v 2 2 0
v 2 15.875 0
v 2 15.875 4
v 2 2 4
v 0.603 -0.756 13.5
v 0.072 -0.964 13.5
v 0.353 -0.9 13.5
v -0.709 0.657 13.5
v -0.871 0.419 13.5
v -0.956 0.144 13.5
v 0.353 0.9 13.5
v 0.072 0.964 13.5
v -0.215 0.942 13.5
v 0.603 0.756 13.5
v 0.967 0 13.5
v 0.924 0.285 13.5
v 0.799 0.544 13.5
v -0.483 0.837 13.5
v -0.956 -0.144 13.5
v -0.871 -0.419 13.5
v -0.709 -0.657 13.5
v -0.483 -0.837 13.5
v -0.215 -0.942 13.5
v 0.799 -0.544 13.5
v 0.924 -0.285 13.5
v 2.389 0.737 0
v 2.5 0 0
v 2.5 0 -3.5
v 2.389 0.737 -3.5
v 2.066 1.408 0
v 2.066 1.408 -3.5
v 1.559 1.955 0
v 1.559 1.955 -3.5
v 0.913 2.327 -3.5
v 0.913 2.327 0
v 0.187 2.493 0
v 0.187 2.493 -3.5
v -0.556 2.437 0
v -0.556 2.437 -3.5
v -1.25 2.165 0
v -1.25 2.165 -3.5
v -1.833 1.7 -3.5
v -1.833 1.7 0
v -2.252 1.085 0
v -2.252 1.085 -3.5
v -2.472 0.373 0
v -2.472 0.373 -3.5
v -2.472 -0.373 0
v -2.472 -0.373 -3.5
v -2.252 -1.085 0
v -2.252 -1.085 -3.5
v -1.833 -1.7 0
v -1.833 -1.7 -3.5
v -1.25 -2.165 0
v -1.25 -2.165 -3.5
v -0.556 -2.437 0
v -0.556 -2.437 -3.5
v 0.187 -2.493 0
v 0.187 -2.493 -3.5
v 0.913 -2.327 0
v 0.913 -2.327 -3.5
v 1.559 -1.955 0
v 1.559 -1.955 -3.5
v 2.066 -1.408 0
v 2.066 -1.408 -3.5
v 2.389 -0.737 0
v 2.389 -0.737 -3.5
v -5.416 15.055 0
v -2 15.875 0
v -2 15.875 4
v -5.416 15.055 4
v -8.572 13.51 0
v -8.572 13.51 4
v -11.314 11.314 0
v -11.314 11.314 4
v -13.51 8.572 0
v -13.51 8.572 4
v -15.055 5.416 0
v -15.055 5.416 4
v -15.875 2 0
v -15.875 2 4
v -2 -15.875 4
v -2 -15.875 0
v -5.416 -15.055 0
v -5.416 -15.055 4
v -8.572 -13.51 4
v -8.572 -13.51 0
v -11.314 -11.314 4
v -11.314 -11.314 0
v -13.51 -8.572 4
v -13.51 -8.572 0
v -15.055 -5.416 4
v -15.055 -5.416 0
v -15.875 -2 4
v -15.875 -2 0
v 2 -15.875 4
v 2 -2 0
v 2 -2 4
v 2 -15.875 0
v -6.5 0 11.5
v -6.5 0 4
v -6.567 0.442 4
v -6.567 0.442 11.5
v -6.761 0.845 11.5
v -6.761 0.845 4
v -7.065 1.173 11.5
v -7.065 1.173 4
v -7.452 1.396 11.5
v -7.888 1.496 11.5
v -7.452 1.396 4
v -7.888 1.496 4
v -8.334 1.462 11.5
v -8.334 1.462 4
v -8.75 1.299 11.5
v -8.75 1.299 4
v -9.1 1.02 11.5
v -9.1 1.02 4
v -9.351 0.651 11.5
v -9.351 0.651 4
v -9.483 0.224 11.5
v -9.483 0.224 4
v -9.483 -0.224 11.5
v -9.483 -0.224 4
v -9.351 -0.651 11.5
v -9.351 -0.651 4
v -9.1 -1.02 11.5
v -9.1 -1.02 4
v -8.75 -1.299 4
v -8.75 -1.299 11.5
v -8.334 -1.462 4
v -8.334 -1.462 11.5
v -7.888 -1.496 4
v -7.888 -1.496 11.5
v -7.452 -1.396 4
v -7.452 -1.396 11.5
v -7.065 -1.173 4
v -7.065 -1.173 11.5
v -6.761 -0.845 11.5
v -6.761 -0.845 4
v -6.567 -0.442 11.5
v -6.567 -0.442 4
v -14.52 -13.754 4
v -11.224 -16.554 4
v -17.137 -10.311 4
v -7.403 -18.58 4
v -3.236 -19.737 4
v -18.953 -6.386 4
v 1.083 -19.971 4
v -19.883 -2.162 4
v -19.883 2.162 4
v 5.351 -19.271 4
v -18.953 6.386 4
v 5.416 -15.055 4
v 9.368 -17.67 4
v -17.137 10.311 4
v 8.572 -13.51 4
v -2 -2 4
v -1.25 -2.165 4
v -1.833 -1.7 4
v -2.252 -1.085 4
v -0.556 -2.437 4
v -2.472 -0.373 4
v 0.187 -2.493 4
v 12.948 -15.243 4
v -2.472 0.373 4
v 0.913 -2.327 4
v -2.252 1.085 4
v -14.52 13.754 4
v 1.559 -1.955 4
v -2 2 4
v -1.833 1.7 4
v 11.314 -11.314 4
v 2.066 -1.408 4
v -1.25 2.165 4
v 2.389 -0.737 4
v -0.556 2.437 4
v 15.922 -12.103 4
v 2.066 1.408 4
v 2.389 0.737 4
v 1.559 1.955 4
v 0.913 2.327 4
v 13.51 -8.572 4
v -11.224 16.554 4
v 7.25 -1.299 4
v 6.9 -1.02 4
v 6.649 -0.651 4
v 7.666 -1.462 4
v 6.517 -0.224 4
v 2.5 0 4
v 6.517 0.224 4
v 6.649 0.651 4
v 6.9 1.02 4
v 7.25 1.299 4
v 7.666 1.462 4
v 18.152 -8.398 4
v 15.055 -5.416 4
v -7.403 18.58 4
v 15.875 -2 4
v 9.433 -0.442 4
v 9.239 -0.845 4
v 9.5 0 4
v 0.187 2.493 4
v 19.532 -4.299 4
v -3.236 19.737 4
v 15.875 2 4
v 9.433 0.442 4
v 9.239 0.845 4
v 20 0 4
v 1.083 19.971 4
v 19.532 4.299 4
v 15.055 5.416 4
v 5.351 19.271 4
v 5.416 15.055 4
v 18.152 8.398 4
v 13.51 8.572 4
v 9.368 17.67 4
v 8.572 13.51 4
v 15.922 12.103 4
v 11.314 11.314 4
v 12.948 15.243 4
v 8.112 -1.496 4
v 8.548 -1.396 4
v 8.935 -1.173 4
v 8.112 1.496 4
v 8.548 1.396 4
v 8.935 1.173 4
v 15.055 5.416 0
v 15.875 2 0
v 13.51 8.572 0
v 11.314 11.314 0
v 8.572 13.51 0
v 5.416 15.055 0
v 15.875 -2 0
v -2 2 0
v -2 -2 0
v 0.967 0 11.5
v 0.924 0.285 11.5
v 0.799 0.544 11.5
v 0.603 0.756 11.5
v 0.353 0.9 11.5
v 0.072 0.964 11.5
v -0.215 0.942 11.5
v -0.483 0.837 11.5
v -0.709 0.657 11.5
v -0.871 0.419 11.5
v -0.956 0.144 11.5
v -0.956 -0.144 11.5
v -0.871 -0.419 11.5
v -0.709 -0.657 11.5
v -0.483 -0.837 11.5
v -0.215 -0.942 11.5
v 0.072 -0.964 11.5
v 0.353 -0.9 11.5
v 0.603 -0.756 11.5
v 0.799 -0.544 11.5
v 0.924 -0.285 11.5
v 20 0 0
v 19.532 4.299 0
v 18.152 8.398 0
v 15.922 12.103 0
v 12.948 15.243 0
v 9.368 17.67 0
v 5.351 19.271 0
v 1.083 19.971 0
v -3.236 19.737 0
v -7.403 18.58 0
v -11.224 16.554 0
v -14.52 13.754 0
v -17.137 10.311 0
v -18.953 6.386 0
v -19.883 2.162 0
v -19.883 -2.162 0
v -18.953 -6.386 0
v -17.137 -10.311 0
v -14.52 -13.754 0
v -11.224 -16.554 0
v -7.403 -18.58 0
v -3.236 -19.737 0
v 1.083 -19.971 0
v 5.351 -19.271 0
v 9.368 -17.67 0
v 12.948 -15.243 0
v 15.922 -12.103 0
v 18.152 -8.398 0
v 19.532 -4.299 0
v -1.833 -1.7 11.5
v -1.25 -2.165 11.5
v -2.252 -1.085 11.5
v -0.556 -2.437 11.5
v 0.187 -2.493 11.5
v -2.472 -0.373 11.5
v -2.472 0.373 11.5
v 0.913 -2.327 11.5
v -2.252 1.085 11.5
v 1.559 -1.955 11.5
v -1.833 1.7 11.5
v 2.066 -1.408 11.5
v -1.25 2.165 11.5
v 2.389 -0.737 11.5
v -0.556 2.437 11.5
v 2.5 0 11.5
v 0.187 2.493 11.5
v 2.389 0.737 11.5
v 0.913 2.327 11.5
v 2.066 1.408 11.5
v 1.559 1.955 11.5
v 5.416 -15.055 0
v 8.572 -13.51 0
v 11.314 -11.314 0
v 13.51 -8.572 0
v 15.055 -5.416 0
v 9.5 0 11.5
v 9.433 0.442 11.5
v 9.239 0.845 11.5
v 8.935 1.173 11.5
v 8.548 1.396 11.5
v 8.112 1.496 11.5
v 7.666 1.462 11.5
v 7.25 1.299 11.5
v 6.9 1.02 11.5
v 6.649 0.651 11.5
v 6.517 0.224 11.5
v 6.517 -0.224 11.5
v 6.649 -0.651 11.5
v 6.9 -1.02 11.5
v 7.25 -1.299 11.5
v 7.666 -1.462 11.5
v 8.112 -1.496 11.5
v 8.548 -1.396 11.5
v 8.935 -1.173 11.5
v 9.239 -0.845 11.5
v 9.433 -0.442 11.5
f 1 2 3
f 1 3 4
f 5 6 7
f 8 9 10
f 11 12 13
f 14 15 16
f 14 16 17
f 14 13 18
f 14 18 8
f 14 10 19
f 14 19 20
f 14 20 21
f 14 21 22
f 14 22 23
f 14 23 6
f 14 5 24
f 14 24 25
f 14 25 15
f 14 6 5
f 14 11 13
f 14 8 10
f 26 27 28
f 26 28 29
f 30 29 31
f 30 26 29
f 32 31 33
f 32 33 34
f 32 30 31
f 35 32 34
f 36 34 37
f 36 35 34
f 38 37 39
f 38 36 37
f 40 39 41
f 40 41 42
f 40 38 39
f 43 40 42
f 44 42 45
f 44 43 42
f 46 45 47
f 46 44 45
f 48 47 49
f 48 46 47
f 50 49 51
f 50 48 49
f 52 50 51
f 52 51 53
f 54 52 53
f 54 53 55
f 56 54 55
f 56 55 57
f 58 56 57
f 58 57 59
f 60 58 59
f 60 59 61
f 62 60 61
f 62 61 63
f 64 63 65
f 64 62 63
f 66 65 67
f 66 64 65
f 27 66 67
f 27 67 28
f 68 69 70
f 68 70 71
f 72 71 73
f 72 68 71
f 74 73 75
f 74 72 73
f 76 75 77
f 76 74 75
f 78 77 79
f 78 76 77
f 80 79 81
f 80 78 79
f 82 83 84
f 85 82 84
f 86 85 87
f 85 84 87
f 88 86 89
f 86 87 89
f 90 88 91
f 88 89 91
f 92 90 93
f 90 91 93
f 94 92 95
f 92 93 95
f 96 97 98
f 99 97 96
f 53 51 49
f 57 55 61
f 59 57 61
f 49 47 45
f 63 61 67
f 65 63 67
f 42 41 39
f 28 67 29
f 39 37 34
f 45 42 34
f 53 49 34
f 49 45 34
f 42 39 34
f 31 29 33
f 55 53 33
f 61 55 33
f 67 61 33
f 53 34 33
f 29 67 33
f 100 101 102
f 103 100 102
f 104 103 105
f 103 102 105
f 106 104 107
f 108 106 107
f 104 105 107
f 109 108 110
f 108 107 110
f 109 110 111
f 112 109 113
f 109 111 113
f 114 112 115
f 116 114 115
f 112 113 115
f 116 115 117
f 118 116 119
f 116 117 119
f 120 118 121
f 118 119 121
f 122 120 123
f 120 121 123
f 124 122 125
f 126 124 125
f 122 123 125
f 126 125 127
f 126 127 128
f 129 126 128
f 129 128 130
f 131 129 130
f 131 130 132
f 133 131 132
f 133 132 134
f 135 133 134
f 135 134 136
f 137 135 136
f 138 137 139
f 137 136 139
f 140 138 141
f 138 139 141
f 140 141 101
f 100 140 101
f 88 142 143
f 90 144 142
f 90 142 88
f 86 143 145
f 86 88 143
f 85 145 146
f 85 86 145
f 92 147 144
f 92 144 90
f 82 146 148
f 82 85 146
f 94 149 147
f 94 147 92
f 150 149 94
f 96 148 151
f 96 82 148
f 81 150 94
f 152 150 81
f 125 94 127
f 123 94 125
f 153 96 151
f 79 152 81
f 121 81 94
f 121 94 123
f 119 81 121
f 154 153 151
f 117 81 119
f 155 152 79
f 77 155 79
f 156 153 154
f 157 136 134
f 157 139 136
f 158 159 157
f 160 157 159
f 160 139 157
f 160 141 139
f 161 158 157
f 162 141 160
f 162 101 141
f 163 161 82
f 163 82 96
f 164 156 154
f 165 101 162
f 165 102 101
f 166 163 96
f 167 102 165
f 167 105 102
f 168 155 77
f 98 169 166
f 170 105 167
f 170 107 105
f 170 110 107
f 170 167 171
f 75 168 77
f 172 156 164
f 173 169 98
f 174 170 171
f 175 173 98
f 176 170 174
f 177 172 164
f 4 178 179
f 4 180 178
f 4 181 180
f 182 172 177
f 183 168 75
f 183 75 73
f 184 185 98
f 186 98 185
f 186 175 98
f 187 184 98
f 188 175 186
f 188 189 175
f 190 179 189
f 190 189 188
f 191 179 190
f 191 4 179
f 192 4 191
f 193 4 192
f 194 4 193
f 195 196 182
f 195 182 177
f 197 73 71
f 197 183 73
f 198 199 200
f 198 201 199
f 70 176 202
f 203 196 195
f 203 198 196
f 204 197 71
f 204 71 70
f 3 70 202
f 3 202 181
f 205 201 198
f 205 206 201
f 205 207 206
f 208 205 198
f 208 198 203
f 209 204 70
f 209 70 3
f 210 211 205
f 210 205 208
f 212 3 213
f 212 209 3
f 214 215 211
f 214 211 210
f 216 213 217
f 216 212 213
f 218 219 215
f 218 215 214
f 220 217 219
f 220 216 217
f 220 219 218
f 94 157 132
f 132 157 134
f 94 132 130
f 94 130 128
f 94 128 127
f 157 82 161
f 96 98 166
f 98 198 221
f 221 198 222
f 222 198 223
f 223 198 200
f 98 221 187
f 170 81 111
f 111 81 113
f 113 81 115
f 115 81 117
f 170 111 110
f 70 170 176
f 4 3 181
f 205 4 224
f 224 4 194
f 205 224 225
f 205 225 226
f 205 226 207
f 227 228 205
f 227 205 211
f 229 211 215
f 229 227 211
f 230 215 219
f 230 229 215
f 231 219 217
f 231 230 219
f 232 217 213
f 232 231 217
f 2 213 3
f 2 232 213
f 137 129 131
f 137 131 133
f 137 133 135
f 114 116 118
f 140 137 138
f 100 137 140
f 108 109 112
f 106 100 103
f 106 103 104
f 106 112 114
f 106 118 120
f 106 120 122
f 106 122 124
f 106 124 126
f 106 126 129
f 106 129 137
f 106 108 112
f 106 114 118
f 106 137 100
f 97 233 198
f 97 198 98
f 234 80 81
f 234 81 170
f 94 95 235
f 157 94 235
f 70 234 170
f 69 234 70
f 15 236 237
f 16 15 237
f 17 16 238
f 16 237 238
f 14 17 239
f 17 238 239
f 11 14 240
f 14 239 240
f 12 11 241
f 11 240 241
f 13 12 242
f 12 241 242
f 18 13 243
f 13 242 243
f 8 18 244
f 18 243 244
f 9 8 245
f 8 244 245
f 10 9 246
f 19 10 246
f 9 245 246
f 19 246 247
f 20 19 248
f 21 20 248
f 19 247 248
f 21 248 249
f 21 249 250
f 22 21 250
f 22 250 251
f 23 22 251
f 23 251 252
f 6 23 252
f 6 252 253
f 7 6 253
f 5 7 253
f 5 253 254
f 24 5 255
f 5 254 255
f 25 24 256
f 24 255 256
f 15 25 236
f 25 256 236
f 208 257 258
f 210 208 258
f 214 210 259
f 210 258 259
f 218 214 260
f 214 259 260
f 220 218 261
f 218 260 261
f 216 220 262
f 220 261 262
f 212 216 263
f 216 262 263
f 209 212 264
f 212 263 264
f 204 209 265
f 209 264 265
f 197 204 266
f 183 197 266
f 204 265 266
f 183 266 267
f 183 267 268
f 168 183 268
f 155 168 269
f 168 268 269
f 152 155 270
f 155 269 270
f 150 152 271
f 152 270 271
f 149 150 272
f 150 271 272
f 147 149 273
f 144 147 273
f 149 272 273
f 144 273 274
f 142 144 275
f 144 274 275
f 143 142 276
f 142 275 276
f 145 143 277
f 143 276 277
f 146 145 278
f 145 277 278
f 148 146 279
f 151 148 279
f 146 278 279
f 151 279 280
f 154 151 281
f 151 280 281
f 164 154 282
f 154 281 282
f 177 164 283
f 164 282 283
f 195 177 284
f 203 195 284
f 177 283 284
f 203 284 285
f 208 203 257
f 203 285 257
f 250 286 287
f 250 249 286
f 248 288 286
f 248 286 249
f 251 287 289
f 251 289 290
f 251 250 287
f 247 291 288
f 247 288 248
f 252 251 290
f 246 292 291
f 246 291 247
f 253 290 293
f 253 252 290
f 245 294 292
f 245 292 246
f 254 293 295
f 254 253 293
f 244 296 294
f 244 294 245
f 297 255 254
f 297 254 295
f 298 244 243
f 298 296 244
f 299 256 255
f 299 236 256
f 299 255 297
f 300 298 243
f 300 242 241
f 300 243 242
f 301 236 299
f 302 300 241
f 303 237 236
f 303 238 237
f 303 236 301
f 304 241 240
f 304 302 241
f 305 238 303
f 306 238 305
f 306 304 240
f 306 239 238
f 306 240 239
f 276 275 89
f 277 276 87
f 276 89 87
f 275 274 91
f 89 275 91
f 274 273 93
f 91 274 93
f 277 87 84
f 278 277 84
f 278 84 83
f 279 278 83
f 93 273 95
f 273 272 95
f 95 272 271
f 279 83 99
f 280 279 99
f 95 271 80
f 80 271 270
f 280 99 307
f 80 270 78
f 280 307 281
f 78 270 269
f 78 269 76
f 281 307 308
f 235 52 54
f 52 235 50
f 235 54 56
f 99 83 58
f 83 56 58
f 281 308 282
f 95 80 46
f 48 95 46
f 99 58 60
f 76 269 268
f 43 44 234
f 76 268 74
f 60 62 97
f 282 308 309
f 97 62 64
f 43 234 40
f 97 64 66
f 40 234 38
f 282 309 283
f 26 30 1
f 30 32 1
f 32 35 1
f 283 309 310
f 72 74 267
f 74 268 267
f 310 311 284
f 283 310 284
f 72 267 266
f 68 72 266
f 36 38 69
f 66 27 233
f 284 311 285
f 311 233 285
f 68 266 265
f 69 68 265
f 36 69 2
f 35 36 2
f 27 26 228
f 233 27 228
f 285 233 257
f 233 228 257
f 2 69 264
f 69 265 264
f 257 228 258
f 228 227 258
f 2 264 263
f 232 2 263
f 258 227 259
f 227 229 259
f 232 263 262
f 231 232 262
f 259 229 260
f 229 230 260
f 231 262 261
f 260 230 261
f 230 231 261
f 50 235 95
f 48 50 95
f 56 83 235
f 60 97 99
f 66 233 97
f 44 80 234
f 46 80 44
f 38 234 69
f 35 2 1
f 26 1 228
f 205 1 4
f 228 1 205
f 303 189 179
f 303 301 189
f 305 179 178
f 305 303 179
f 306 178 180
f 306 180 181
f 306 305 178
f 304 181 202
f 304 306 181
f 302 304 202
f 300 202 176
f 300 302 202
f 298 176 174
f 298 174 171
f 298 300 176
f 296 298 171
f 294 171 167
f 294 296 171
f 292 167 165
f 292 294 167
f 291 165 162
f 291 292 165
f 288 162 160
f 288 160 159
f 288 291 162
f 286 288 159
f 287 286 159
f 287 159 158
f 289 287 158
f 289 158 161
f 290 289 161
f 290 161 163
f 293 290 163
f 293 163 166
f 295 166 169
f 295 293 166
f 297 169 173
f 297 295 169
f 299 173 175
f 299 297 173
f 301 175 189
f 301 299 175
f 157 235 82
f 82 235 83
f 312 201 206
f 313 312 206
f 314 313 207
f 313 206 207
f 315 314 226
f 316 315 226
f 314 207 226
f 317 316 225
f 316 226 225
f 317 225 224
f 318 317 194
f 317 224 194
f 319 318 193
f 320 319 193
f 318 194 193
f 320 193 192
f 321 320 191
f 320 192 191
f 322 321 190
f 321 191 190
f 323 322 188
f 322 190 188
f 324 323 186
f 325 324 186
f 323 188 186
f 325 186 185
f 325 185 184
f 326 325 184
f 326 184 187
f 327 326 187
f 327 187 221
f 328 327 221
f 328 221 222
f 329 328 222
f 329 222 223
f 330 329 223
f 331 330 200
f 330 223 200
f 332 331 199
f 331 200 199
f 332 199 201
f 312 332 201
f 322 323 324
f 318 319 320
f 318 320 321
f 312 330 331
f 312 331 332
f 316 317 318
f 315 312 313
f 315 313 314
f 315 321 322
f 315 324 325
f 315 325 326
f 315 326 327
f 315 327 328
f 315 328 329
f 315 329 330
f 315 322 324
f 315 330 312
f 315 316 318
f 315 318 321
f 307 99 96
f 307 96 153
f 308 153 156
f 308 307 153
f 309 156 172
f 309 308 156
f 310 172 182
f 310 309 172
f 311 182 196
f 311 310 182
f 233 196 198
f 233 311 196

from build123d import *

# Parameters (mm, degrees)
ESQUISSE1_R        = 20
BOSS_EXTRU_1_DEPTH = 4
ESQUISSE2_R        = 2.5
BOSS_EXTRU_2_DEPTH = 7.5
ESQUISSE3_R        = 0.966516747
BOSS_EXTRU_3_DEPTH = 2
ESQUISSE4_R        = 1.5
BOSS_EXTRU_4_DEPTH = 7.5


with BuildPart() as part:
    # Esquisse1 → Boss.-Extru.1 (new body)
    with BuildSketch(Plane.XY):
        Circle(ESQUISSE1_R)
        with BuildLine():
            Line((-15.874507866, 2), (-2, 2))
            Line((-2, 2), (-2, 15.874507866))
            ThreePointArc((-2, 15.874507866), (-11.313708499, 11.313708499), (-15.874507866, 2))
        make_face(mode=Mode.SUBTRACT)
        with BuildLine():
            Line((-15.874507866, -2), (-2, -2))
            Line((-2, -2), (-2, -15.874507866))
            ThreePointArc((-2, -15.874507866), (-11.313708499, -11.313708499), (-15.874507866, -2))
        make_face(mode=Mode.SUBTRACT)
        with BuildLine():
            Line((2, 15.874507866), (2, 2))
            Line((2, 2), (15.874507866, 2))
            ThreePointArc((15.874507866, 2), (11.313708499, 11.313708499), (2, 15.874507866))
        make_face(mode=Mode.SUBTRACT)
        with BuildLine():
            Line((2, -2), (2, -15.874507866))
            ThreePointArc((2, -15.874507866), (11.313708499, -11.313708499), (15.874507866, -2))
            Line((15.874507866, -2), (2, -2))
        make_face(mode=Mode.SUBTRACT)
    extrude(amount=BOSS_EXTRU_1_DEPTH)

    # Esquisse2 → Boss.-Extru.2 (add, symmetric)
    with BuildSketch(Plane.XY.offset(4)):
        Circle(ESQUISSE2_R)
    extrude(amount=BOSS_EXTRU_2_DEPTH, both=True)

    # Esquisse3 → Boss.-Extru.3 (add)
    with BuildSketch(Plane.XY.offset(11.5)):
        Circle(ESQUISSE3_R)
    extrude(amount=BOSS_EXTRU_3_DEPTH)

    # Esquisse4 → Boss.-Extru.4 (add)
    with BuildSketch(Plane.XY.offset(4)):
        with Locations((8, 0)):
            Circle(ESQUISSE4_R)
        with Locations((-8, 0)):
            Circle(ESQUISSE4_R)
    extrude(amount=BOSS_EXTRU_4_DEPTH)


solid = part.part
